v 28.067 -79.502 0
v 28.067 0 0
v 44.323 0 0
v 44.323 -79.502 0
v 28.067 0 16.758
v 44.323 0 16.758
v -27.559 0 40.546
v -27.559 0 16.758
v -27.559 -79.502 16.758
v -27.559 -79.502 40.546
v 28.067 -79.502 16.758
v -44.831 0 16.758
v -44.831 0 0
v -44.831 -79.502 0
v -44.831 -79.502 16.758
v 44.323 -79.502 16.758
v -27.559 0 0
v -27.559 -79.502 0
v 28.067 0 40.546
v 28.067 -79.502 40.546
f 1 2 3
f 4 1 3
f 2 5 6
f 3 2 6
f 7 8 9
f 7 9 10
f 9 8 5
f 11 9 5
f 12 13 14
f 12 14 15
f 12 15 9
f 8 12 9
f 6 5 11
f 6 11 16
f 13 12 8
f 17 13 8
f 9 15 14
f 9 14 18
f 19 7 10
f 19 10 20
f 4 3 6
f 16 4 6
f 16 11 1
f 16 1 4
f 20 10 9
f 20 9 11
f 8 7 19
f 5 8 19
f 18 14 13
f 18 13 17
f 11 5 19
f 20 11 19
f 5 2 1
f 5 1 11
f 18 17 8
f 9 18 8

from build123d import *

# Parameters (mm, degrees)
F0_W     = 17.2719992697
F0_H     = 16.7580059669
F1_DEPTH = 79.502
F0_W_2   = 55.6260049343
F0_H_2   = 23.787911917
F0_W_3   = 16.2559971213


with BuildPart() as f1:
    # F0 (on Front) → F1 (new body)
    with BuildSketch(Plane.XZ):
        with Locations((-36.1950006336, 8.3790029835)):
            Rectangle(F0_W, F0_H)
    extrude(amount=F1_DEPTH)


with BuildPart() as f1b:
    # F0 (on Front) → F1, piece 2 (new body)
    with BuildSketch(Plane.XZ):
        with Locations((0.2540014684, 28.6519619254)):
            Rectangle(F0_W_2, F0_H_2)
    extrude(amount=F1_DEPTH)


with BuildPart() as f1c:
    # F0 (on Front) → F1, piece 3 (new body)
    with BuildSketch(Plane.XZ):
        with Locations((36.1950024962, 8.3790029835)):
            Rectangle(F0_W_3, F0_H)
    extrude(amount=F1_DEPTH)


solid = Compound([f1.part, f1b.part, f1c.part])
